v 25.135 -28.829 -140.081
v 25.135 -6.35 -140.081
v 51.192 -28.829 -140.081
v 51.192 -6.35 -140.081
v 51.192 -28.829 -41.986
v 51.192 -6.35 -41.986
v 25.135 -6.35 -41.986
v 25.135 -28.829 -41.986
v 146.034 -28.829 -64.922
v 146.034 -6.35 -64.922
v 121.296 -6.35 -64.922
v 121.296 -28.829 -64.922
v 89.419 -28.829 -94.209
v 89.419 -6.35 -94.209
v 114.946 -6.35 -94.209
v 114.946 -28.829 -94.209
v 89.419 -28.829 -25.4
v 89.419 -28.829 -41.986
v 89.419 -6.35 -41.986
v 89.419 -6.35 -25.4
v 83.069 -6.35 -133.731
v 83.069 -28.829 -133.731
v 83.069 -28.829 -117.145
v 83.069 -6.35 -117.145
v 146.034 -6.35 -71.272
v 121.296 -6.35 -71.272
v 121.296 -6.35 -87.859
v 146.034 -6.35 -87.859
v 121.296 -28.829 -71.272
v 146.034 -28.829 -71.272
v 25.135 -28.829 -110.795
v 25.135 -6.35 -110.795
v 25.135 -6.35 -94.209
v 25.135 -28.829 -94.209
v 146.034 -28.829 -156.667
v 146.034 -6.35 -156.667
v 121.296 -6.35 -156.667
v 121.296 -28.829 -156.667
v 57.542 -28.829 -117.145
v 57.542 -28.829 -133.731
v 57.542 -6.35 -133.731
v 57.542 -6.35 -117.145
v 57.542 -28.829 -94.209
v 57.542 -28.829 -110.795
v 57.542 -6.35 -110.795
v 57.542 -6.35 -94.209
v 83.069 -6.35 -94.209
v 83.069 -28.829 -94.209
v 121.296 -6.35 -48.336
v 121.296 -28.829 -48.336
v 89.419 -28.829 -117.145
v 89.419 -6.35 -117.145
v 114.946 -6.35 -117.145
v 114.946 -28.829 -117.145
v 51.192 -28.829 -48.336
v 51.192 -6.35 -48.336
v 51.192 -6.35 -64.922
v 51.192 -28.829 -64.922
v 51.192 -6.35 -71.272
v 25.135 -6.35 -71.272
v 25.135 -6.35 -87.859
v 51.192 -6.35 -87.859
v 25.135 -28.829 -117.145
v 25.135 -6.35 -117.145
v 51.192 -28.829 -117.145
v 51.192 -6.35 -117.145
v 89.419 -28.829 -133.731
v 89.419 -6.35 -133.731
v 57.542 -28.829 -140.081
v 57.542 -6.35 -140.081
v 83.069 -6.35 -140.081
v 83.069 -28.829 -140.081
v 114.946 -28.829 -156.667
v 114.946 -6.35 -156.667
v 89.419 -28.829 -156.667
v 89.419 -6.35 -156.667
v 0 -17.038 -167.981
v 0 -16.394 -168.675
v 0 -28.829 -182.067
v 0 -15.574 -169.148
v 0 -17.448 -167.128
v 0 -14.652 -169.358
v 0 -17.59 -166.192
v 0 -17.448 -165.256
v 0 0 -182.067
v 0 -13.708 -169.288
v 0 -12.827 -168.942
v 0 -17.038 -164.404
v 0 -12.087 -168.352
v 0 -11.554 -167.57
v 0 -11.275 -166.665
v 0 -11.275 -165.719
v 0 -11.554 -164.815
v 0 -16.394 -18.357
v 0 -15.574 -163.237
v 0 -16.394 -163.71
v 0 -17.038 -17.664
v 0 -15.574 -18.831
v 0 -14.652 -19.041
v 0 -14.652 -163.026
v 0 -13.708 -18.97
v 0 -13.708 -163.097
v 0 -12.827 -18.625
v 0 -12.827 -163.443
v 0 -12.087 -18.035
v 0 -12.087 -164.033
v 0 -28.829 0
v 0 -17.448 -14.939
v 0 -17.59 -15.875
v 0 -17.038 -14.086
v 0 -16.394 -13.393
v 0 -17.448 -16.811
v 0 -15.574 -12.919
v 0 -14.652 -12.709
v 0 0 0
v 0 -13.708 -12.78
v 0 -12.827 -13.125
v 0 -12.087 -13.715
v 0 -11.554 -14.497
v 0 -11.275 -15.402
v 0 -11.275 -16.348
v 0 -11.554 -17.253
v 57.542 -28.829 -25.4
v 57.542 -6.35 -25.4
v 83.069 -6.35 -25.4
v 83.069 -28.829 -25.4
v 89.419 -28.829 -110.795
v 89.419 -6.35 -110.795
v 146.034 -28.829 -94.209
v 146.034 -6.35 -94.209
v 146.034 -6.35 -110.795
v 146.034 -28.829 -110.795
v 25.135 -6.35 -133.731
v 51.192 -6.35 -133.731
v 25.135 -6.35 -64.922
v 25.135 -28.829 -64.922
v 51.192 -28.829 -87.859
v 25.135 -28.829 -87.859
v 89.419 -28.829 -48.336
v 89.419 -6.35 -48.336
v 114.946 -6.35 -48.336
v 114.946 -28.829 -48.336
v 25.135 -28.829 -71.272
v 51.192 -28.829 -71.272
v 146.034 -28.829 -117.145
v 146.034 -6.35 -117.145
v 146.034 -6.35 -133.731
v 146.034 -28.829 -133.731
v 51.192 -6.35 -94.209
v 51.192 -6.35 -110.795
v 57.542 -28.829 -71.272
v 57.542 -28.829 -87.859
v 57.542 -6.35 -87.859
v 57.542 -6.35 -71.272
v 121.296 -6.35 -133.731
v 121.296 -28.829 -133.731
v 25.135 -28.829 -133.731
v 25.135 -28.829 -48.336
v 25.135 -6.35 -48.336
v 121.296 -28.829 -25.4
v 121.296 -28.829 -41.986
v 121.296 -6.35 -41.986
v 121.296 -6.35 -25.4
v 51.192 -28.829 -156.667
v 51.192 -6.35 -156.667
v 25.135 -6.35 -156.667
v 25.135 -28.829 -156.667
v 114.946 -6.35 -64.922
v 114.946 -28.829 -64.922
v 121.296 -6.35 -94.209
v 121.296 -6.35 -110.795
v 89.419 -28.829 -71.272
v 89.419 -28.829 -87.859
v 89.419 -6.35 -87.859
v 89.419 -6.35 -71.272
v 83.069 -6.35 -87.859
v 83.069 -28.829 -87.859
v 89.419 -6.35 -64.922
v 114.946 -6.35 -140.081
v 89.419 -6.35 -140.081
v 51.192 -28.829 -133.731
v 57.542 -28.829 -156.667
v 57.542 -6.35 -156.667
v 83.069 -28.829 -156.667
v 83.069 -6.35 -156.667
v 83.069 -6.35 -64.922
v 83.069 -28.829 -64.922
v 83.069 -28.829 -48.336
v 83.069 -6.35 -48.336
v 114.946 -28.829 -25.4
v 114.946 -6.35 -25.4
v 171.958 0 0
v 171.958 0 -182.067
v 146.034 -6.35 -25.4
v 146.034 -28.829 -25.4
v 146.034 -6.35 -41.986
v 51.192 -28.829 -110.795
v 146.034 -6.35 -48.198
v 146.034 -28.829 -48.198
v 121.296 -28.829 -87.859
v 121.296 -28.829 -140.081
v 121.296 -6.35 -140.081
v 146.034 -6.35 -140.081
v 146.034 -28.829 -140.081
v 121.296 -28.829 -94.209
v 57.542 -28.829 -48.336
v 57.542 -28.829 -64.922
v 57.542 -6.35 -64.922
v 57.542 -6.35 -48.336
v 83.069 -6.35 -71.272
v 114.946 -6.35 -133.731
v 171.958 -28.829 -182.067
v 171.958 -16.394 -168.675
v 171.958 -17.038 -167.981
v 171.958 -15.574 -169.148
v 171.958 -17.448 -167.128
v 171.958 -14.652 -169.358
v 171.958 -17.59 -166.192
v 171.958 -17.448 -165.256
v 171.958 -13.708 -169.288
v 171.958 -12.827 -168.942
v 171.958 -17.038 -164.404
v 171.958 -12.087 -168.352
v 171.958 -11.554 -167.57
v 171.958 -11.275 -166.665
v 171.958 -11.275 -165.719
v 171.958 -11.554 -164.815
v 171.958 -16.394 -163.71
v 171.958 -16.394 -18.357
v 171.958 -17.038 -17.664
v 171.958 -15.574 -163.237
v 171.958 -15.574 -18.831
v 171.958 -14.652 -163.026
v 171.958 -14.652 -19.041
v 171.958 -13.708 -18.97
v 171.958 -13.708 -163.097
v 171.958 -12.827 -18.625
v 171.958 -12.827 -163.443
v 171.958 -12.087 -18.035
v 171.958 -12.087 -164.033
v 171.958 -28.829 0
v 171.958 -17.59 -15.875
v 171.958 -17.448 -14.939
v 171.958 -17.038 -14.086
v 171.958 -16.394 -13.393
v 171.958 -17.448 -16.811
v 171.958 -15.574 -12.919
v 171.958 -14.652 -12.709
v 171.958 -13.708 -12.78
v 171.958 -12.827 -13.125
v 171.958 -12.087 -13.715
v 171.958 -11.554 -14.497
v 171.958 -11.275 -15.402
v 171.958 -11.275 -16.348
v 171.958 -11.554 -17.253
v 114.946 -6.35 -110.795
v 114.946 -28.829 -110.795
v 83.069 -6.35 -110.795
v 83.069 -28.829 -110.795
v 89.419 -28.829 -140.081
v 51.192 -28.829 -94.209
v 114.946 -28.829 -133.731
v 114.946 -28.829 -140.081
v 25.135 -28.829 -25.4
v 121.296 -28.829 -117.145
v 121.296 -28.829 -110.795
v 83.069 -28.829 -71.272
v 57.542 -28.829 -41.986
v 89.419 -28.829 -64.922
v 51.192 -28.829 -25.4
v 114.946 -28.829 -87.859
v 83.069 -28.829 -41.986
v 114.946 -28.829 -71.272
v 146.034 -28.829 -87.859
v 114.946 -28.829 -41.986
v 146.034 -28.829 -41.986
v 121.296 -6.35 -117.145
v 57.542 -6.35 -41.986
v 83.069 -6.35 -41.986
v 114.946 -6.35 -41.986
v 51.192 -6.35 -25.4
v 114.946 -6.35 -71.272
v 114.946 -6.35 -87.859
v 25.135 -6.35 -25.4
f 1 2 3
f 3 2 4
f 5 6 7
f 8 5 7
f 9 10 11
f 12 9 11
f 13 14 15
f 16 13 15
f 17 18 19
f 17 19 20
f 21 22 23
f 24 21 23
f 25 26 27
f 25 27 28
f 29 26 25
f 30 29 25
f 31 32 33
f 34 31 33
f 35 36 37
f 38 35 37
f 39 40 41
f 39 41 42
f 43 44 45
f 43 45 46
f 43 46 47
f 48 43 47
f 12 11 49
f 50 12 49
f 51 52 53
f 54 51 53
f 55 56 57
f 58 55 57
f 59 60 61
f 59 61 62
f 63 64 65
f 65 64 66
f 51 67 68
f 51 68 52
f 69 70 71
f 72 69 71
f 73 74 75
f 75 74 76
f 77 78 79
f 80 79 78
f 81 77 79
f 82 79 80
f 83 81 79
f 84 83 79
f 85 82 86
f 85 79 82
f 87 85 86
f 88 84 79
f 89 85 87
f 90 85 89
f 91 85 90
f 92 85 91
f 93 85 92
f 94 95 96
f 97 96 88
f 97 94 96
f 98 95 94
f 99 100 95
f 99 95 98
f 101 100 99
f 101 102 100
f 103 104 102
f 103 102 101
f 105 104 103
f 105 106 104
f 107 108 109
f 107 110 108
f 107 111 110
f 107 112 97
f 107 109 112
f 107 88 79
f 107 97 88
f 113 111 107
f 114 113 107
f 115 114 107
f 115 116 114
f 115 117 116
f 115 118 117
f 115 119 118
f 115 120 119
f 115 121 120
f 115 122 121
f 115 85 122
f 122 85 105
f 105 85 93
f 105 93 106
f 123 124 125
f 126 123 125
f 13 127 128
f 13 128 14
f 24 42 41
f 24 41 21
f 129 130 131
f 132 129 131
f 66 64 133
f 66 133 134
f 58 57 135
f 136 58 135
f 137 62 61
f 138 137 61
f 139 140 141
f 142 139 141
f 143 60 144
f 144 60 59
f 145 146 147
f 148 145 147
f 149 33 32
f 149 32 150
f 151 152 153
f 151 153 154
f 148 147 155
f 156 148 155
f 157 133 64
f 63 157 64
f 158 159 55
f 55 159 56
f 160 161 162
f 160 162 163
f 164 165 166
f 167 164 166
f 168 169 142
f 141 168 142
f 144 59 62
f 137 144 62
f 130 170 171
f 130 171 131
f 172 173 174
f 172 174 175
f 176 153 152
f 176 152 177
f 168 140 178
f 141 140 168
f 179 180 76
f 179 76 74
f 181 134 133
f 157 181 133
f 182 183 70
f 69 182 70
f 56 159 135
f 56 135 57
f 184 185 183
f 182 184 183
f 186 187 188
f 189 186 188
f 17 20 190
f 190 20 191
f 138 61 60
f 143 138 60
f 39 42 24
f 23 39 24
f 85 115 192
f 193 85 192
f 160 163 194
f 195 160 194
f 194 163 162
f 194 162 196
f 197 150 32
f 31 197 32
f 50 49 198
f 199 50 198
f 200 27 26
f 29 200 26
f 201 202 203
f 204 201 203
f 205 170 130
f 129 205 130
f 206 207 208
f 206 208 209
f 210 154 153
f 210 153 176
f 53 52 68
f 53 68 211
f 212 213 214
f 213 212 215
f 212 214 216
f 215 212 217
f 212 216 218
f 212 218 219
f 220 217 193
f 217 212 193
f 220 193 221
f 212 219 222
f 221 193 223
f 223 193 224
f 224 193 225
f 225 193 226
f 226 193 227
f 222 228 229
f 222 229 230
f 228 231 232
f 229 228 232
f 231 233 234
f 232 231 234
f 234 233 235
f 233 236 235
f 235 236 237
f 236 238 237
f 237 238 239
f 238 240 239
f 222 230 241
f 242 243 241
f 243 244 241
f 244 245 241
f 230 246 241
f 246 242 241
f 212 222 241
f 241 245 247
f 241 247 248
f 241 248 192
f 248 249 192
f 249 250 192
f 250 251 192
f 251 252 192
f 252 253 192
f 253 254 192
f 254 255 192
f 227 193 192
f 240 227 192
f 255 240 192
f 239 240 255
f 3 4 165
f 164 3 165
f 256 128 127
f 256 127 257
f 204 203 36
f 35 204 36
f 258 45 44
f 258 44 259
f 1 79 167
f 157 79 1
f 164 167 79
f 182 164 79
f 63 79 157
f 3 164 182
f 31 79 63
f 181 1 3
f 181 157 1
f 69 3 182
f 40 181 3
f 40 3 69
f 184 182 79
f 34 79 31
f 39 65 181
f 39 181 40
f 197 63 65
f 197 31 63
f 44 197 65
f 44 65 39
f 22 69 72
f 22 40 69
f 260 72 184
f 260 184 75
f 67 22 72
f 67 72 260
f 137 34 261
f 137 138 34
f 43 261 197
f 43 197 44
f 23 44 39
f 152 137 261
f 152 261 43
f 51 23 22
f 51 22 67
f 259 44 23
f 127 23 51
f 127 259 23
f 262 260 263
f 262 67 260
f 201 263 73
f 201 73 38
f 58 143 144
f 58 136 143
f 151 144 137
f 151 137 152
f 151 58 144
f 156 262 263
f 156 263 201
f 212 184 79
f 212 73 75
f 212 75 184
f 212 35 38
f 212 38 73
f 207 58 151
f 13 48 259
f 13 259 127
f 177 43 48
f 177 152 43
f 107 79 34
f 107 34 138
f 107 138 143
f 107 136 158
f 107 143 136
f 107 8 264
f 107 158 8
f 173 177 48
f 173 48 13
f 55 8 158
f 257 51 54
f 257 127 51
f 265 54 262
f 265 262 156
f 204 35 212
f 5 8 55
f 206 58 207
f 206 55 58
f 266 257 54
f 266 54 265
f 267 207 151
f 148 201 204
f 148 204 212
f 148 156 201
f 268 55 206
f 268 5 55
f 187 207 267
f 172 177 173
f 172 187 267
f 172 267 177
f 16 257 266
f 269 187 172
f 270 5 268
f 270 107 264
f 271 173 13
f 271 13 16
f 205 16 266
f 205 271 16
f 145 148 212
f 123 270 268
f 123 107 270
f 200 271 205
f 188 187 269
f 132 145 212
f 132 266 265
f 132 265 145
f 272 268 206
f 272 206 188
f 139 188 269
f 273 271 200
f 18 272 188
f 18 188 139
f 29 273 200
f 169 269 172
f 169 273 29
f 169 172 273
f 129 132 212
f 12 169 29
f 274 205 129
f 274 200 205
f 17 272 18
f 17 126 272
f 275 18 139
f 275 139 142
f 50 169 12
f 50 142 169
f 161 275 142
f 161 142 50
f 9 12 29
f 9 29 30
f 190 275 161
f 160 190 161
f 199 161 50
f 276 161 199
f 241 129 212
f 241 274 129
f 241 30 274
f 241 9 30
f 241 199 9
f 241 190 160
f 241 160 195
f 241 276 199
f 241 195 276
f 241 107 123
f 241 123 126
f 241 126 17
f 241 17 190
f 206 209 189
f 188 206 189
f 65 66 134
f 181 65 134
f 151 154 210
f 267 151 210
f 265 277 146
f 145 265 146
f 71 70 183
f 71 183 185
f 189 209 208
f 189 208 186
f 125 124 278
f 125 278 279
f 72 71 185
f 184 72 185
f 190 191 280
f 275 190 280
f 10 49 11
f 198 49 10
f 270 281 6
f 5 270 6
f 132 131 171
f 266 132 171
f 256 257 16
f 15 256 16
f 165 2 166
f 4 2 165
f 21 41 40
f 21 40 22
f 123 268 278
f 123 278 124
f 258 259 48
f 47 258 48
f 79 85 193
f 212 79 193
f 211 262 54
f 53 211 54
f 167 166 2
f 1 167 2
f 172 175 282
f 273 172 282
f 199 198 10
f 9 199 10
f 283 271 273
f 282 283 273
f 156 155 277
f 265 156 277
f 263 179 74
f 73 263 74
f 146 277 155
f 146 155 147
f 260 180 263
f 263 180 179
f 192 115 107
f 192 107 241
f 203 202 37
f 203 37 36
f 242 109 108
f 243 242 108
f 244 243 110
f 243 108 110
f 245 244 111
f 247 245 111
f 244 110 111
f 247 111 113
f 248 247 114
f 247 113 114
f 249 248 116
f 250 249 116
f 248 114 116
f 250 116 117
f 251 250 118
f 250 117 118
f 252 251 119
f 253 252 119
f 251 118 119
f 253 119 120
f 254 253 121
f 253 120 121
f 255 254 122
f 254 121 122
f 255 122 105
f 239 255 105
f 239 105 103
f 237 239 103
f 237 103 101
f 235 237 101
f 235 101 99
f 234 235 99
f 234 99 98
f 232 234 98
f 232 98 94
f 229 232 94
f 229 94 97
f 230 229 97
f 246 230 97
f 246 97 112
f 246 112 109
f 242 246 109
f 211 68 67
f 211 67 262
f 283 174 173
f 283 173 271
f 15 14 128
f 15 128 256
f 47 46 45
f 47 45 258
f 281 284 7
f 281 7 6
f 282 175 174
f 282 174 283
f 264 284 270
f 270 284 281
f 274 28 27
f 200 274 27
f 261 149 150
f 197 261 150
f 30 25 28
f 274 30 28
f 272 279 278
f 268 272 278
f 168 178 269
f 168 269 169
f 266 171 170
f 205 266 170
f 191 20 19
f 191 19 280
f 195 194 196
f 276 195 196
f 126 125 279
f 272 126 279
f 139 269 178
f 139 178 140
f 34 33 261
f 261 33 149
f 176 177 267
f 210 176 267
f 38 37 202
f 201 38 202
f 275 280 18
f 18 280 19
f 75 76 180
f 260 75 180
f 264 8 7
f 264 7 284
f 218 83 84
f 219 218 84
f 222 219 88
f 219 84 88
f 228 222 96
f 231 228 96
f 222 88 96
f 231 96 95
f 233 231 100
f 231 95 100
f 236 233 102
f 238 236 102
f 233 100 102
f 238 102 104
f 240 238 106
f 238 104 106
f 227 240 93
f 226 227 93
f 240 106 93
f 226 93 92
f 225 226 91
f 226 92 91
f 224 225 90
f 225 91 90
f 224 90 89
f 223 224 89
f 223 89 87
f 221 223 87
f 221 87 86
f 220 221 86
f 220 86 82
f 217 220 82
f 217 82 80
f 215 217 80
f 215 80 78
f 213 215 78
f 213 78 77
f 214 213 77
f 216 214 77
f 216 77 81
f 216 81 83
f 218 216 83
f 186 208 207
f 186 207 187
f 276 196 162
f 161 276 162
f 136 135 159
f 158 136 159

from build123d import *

# Parameters (mm, degrees)
F0_W     = 171.958
F0_H     = 182.0672
F0_W_2   = 25.527
F0_H_2   = 16.5862
F1_DEPTH = 28.829
F0_W_3   = 24.7371567947
F2_DEPTH = 6.35
F3_R     = 3.175
F4_DEPTH = 203.2


# Not quite as in the source:
# - a length typed as a fraction of an inch, garbled in the dataset ("3 / 203.2 mm" for 3/8 in), is restored


with BuildPart() as f1:
    # F0 (on Front) → F1 (new body)
    with BuildSketch(Plane.XZ):
        with Locations((85.979, -91.0336)):
            Rectangle(F0_W, F0_H)
        Polygon((25.1346008565, -41.4550490677), (25.1346008565, -25.4), (51.1923991435, -25.4), (57.5423991435, -25.4), (83.0693991435, -25.4), (85.5840783974, -25.4), (89.4193991435, -25.4), (114.9463991435, -25.4), (121.2963991435, -25.4), (146.0335559382, -25.4), (146.0335559382, -41.9862), (146.0335559382, -48.1976613704), (146.0335559382, -64.9224), (146.0335559382, -71.2724), (146.0335559382, -87.8586), (146.0335559382, -94.2086), (146.0335559382, -110.7948), (146.0335559382, -117.1448), (146.0335559382, -133.731), (146.0335559382, -140.081), (146.0335559382, -156.6672), (121.2963991435, -156.6672), (114.9463991435, -156.6672), (89.4193991435, -156.6672), (83.0693991435, -156.6672), (57.5423991435, -156.6672), (51.1923991435, -156.6672), (25.1346008565, -156.6672), (25.1346008565, -140.081), (25.1346008565, -133.731), (25.1346008565, -117.1448), (25.1346008565, -110.7948), (25.1346008565, -94.2086), (25.1346008565, -87.8586), (25.1346008565, -71.2724), (25.1346008565, -64.9224), (25.1346008565, -48.3362), (25.1346008565, -41.9862), align=None, mode=Mode.SUBTRACT)
        Polygon((57.5423991435, -25.4), (51.1923991435, -25.4), (51.1923991435, -41.9862), (25.1346008565, -41.9862), (25.1346008565, -48.3362), (38.1635, -48.3362), (51.1923991435, -48.3362), (51.1923991435, -64.9224), (38.1635, -64.9224), (25.1346008565, -64.9224), (25.1346008565, -71.2724), (38.1635, -71.2724), (51.1923991435, -71.2724), (51.1923991435, -87.8586), (38.1635, -87.8586), (25.1346008565, -87.8586), (25.1346008565, -94.2086), (38.1635, -94.2086), (51.1923991435, -94.2086), (51.1923991435, -110.7948), (25.1346008565, -110.7948), (25.1346008565, -117.1448), (38.1635, -117.1448), (51.1923991435, -117.1448), (51.1923991435, -133.731), (38.1635, -133.731), (25.1346008565, -133.731), (25.1346008565, -140.081), (38.1635, -140.081), (51.1923991435, -140.081), (51.1923991435, -156.6672), (57.5423991435, -156.6672), (57.5423991435, -140.081), (83.0693991435, -140.081), (83.0693991435, -156.6672), (89.4193991435, -156.6672), (89.4193991435, -140.081), (114.9463991435, -140.081), (114.9463991435, -156.6672), (121.2963991435, -156.6672), (121.2963991435, -140.081), (146.0335559382, -140.081), (146.0335559382, -133.731), (121.2963991435, -133.731), (121.2963991435, -117.1448), (146.0335559382, -117.1448), (146.0335559382, -110.7948), (121.2963991435, -110.7948), (121.2963991435, -94.2086), (146.0335559382, -94.2086), (146.0335559382, -87.8586), (121.2963991435, -87.8586), (121.2963991435, -71.2724), (146.0335559382, -71.2724), (146.0335559382, -64.9224), (121.2963991435, -64.9224), (121.2963991435, -48.3362), (146.0335559382, -48.1976613704), (146.0335559382, -41.9862), (121.2963991435, -41.9862), (121.2963991435, -25.4), (114.9463991435, -25.4), (114.9463991435, -41.9862), (89.4193991435, -41.9862), (89.4193991435, -25.4), (85.5840783974, -25.4), (83.0693991435, -25.4), (83.0693991435, -41.9862), (57.5423991435, -41.9862), align=None)
        with Locations((70.3058991435, -125.4379)):
            Rectangle(F0_W_2, F0_H_2, mode=Mode.SUBTRACT)
        with Locations((70.3058991435, -102.5017)):
            Rectangle(F0_W_2, F0_H_2, mode=Mode.SUBTRACT)
        with Locations((102.1828991435, -125.4379)):
            Rectangle(F0_W_2, F0_H_2, mode=Mode.SUBTRACT)
        with Locations((102.1828991435, -102.5017)):
            Rectangle(F0_W_2, F0_H_2, mode=Mode.SUBTRACT)
        with Locations((70.3058991435, -79.5655)):
            Rectangle(F0_W_2, F0_H_2, mode=Mode.SUBTRACT)
        with Locations((70.3058991435, -56.6293)):
            Rectangle(F0_W_2, F0_H_2, mode=Mode.SUBTRACT)
        with Locations((102.1828991435, -79.5655)):
            Rectangle(F0_W_2, F0_H_2, mode=Mode.SUBTRACT)
        with Locations((102.1828991435, -56.6293)):
            Rectangle(F0_W_2, F0_H_2, mode=Mode.SUBTRACT)
    extrude(amount=F1_DEPTH)

    # F0 (on Front) → F2 (join)
    with BuildSketch(Plane.XZ):
        Polygon((51.1923991435, -25.4), (25.1346008565, -25.4), (25.1346008565, -41.4550490677), (25.1346008565, -41.9862), (51.1923991435, -41.9862), align=None)
        with Locations((70.3058991435, -33.6931)):
            Rectangle(F0_W_2, F0_H_2)
        with Locations((102.1828991435, -33.6931)):
            Rectangle(F0_W_2, F0_H_2)
        with Locations((133.6649775409, -33.6931)):
            Rectangle(F0_W_3, F0_H_2)
        Polygon((146.0335559382, -64.9224), (146.0335559382, -48.1976613704), (121.2963991435, -48.3362), (121.2963991435, -64.9224), align=None)
        with Locations((102.1828991435, -56.6293)):
            Rectangle(F0_W_2, F0_H_2)
        with Locations((70.3058991435, -56.6293)):
            Rectangle(F0_W_2, F0_H_2)
        Polygon((38.1635, -48.3362), (25.1346008565, -48.3362), (25.1346008565, -64.9224), (38.1635, -64.9224), (51.1923991435, -64.9224), (51.1923991435, -48.3362), align=None)
        Polygon((38.1635, -71.2724), (25.1346008565, -71.2724), (25.1346008565, -87.8586), (38.1635, -87.8586), (51.1923991435, -87.8586), (51.1923991435, -71.2724), align=None)
        with Locations((70.3058991435, -79.5655)):
            Rectangle(F0_W_2, F0_H_2)
        with Locations((102.1828991435, -79.5655)):
            Rectangle(F0_W_2, F0_H_2)
        with Locations((133.6649775409, -79.5655)):
            Rectangle(F0_W_3, F0_H_2)
        with Locations((133.6649775409, -102.5017)):
            Rectangle(F0_W_3, F0_H_2)
        with Locations((102.1828991435, -102.5017)):
            Rectangle(F0_W_2, F0_H_2)
        with Locations((70.3058991435, -102.5017)):
            Rectangle(F0_W_2, F0_H_2)
        Polygon((38.1635, -94.2086), (25.1346008565, -94.2086), (25.1346008565, -110.7948), (51.1923991435, -110.7948), (51.1923991435, -94.2086), align=None)
        Polygon((38.1635, -117.1448), (25.1346008565, -117.1448), (25.1346008565, -133.731), (38.1635, -133.731), (51.1923991435, -133.731), (51.1923991435, -117.1448), align=None)
        with Locations((133.6649775409, -125.4379)):
            Rectangle(F0_W_3, F0_H_2)
        with Locations((133.6649775409, -148.3741)):
            Rectangle(F0_W_3, F0_H_2)
        with Locations((102.1828991435, -148.3741)):
            Rectangle(F0_W_2, F0_H_2)
        with Locations((70.3058991435, -148.3741)):
            Rectangle(F0_W_2, F0_H_2)
        Polygon((38.1635, -140.081), (25.1346008565, -140.081), (25.1346008565, -156.6672), (51.1923991435, -156.6672), (51.1923991435, -140.081), align=None)
        with Locations((102.1828991435, -125.4379)):
            Rectangle(F0_W_2, F0_H_2)
        with Locations((70.3058991435, -125.4379)):
            Rectangle(F0_W_2, F0_H_2)
    extrude(amount=F2_DEPTH)

    # F3 (on face) → F4 (cut)
    with BuildSketch(Plane(origin=(0, 0, 0), x_dir=(0, -1, 0), z_dir=(-1, 0, 0))):
        with Locations((14.4145, -15.875)):
            Circle(F3_R)
        with Locations((14.4145, -166.1922)):
            Circle(F3_R)
    extrude(amount=-F4_DEPTH, mode=Mode.SUBTRACT)


solid = f1.part
